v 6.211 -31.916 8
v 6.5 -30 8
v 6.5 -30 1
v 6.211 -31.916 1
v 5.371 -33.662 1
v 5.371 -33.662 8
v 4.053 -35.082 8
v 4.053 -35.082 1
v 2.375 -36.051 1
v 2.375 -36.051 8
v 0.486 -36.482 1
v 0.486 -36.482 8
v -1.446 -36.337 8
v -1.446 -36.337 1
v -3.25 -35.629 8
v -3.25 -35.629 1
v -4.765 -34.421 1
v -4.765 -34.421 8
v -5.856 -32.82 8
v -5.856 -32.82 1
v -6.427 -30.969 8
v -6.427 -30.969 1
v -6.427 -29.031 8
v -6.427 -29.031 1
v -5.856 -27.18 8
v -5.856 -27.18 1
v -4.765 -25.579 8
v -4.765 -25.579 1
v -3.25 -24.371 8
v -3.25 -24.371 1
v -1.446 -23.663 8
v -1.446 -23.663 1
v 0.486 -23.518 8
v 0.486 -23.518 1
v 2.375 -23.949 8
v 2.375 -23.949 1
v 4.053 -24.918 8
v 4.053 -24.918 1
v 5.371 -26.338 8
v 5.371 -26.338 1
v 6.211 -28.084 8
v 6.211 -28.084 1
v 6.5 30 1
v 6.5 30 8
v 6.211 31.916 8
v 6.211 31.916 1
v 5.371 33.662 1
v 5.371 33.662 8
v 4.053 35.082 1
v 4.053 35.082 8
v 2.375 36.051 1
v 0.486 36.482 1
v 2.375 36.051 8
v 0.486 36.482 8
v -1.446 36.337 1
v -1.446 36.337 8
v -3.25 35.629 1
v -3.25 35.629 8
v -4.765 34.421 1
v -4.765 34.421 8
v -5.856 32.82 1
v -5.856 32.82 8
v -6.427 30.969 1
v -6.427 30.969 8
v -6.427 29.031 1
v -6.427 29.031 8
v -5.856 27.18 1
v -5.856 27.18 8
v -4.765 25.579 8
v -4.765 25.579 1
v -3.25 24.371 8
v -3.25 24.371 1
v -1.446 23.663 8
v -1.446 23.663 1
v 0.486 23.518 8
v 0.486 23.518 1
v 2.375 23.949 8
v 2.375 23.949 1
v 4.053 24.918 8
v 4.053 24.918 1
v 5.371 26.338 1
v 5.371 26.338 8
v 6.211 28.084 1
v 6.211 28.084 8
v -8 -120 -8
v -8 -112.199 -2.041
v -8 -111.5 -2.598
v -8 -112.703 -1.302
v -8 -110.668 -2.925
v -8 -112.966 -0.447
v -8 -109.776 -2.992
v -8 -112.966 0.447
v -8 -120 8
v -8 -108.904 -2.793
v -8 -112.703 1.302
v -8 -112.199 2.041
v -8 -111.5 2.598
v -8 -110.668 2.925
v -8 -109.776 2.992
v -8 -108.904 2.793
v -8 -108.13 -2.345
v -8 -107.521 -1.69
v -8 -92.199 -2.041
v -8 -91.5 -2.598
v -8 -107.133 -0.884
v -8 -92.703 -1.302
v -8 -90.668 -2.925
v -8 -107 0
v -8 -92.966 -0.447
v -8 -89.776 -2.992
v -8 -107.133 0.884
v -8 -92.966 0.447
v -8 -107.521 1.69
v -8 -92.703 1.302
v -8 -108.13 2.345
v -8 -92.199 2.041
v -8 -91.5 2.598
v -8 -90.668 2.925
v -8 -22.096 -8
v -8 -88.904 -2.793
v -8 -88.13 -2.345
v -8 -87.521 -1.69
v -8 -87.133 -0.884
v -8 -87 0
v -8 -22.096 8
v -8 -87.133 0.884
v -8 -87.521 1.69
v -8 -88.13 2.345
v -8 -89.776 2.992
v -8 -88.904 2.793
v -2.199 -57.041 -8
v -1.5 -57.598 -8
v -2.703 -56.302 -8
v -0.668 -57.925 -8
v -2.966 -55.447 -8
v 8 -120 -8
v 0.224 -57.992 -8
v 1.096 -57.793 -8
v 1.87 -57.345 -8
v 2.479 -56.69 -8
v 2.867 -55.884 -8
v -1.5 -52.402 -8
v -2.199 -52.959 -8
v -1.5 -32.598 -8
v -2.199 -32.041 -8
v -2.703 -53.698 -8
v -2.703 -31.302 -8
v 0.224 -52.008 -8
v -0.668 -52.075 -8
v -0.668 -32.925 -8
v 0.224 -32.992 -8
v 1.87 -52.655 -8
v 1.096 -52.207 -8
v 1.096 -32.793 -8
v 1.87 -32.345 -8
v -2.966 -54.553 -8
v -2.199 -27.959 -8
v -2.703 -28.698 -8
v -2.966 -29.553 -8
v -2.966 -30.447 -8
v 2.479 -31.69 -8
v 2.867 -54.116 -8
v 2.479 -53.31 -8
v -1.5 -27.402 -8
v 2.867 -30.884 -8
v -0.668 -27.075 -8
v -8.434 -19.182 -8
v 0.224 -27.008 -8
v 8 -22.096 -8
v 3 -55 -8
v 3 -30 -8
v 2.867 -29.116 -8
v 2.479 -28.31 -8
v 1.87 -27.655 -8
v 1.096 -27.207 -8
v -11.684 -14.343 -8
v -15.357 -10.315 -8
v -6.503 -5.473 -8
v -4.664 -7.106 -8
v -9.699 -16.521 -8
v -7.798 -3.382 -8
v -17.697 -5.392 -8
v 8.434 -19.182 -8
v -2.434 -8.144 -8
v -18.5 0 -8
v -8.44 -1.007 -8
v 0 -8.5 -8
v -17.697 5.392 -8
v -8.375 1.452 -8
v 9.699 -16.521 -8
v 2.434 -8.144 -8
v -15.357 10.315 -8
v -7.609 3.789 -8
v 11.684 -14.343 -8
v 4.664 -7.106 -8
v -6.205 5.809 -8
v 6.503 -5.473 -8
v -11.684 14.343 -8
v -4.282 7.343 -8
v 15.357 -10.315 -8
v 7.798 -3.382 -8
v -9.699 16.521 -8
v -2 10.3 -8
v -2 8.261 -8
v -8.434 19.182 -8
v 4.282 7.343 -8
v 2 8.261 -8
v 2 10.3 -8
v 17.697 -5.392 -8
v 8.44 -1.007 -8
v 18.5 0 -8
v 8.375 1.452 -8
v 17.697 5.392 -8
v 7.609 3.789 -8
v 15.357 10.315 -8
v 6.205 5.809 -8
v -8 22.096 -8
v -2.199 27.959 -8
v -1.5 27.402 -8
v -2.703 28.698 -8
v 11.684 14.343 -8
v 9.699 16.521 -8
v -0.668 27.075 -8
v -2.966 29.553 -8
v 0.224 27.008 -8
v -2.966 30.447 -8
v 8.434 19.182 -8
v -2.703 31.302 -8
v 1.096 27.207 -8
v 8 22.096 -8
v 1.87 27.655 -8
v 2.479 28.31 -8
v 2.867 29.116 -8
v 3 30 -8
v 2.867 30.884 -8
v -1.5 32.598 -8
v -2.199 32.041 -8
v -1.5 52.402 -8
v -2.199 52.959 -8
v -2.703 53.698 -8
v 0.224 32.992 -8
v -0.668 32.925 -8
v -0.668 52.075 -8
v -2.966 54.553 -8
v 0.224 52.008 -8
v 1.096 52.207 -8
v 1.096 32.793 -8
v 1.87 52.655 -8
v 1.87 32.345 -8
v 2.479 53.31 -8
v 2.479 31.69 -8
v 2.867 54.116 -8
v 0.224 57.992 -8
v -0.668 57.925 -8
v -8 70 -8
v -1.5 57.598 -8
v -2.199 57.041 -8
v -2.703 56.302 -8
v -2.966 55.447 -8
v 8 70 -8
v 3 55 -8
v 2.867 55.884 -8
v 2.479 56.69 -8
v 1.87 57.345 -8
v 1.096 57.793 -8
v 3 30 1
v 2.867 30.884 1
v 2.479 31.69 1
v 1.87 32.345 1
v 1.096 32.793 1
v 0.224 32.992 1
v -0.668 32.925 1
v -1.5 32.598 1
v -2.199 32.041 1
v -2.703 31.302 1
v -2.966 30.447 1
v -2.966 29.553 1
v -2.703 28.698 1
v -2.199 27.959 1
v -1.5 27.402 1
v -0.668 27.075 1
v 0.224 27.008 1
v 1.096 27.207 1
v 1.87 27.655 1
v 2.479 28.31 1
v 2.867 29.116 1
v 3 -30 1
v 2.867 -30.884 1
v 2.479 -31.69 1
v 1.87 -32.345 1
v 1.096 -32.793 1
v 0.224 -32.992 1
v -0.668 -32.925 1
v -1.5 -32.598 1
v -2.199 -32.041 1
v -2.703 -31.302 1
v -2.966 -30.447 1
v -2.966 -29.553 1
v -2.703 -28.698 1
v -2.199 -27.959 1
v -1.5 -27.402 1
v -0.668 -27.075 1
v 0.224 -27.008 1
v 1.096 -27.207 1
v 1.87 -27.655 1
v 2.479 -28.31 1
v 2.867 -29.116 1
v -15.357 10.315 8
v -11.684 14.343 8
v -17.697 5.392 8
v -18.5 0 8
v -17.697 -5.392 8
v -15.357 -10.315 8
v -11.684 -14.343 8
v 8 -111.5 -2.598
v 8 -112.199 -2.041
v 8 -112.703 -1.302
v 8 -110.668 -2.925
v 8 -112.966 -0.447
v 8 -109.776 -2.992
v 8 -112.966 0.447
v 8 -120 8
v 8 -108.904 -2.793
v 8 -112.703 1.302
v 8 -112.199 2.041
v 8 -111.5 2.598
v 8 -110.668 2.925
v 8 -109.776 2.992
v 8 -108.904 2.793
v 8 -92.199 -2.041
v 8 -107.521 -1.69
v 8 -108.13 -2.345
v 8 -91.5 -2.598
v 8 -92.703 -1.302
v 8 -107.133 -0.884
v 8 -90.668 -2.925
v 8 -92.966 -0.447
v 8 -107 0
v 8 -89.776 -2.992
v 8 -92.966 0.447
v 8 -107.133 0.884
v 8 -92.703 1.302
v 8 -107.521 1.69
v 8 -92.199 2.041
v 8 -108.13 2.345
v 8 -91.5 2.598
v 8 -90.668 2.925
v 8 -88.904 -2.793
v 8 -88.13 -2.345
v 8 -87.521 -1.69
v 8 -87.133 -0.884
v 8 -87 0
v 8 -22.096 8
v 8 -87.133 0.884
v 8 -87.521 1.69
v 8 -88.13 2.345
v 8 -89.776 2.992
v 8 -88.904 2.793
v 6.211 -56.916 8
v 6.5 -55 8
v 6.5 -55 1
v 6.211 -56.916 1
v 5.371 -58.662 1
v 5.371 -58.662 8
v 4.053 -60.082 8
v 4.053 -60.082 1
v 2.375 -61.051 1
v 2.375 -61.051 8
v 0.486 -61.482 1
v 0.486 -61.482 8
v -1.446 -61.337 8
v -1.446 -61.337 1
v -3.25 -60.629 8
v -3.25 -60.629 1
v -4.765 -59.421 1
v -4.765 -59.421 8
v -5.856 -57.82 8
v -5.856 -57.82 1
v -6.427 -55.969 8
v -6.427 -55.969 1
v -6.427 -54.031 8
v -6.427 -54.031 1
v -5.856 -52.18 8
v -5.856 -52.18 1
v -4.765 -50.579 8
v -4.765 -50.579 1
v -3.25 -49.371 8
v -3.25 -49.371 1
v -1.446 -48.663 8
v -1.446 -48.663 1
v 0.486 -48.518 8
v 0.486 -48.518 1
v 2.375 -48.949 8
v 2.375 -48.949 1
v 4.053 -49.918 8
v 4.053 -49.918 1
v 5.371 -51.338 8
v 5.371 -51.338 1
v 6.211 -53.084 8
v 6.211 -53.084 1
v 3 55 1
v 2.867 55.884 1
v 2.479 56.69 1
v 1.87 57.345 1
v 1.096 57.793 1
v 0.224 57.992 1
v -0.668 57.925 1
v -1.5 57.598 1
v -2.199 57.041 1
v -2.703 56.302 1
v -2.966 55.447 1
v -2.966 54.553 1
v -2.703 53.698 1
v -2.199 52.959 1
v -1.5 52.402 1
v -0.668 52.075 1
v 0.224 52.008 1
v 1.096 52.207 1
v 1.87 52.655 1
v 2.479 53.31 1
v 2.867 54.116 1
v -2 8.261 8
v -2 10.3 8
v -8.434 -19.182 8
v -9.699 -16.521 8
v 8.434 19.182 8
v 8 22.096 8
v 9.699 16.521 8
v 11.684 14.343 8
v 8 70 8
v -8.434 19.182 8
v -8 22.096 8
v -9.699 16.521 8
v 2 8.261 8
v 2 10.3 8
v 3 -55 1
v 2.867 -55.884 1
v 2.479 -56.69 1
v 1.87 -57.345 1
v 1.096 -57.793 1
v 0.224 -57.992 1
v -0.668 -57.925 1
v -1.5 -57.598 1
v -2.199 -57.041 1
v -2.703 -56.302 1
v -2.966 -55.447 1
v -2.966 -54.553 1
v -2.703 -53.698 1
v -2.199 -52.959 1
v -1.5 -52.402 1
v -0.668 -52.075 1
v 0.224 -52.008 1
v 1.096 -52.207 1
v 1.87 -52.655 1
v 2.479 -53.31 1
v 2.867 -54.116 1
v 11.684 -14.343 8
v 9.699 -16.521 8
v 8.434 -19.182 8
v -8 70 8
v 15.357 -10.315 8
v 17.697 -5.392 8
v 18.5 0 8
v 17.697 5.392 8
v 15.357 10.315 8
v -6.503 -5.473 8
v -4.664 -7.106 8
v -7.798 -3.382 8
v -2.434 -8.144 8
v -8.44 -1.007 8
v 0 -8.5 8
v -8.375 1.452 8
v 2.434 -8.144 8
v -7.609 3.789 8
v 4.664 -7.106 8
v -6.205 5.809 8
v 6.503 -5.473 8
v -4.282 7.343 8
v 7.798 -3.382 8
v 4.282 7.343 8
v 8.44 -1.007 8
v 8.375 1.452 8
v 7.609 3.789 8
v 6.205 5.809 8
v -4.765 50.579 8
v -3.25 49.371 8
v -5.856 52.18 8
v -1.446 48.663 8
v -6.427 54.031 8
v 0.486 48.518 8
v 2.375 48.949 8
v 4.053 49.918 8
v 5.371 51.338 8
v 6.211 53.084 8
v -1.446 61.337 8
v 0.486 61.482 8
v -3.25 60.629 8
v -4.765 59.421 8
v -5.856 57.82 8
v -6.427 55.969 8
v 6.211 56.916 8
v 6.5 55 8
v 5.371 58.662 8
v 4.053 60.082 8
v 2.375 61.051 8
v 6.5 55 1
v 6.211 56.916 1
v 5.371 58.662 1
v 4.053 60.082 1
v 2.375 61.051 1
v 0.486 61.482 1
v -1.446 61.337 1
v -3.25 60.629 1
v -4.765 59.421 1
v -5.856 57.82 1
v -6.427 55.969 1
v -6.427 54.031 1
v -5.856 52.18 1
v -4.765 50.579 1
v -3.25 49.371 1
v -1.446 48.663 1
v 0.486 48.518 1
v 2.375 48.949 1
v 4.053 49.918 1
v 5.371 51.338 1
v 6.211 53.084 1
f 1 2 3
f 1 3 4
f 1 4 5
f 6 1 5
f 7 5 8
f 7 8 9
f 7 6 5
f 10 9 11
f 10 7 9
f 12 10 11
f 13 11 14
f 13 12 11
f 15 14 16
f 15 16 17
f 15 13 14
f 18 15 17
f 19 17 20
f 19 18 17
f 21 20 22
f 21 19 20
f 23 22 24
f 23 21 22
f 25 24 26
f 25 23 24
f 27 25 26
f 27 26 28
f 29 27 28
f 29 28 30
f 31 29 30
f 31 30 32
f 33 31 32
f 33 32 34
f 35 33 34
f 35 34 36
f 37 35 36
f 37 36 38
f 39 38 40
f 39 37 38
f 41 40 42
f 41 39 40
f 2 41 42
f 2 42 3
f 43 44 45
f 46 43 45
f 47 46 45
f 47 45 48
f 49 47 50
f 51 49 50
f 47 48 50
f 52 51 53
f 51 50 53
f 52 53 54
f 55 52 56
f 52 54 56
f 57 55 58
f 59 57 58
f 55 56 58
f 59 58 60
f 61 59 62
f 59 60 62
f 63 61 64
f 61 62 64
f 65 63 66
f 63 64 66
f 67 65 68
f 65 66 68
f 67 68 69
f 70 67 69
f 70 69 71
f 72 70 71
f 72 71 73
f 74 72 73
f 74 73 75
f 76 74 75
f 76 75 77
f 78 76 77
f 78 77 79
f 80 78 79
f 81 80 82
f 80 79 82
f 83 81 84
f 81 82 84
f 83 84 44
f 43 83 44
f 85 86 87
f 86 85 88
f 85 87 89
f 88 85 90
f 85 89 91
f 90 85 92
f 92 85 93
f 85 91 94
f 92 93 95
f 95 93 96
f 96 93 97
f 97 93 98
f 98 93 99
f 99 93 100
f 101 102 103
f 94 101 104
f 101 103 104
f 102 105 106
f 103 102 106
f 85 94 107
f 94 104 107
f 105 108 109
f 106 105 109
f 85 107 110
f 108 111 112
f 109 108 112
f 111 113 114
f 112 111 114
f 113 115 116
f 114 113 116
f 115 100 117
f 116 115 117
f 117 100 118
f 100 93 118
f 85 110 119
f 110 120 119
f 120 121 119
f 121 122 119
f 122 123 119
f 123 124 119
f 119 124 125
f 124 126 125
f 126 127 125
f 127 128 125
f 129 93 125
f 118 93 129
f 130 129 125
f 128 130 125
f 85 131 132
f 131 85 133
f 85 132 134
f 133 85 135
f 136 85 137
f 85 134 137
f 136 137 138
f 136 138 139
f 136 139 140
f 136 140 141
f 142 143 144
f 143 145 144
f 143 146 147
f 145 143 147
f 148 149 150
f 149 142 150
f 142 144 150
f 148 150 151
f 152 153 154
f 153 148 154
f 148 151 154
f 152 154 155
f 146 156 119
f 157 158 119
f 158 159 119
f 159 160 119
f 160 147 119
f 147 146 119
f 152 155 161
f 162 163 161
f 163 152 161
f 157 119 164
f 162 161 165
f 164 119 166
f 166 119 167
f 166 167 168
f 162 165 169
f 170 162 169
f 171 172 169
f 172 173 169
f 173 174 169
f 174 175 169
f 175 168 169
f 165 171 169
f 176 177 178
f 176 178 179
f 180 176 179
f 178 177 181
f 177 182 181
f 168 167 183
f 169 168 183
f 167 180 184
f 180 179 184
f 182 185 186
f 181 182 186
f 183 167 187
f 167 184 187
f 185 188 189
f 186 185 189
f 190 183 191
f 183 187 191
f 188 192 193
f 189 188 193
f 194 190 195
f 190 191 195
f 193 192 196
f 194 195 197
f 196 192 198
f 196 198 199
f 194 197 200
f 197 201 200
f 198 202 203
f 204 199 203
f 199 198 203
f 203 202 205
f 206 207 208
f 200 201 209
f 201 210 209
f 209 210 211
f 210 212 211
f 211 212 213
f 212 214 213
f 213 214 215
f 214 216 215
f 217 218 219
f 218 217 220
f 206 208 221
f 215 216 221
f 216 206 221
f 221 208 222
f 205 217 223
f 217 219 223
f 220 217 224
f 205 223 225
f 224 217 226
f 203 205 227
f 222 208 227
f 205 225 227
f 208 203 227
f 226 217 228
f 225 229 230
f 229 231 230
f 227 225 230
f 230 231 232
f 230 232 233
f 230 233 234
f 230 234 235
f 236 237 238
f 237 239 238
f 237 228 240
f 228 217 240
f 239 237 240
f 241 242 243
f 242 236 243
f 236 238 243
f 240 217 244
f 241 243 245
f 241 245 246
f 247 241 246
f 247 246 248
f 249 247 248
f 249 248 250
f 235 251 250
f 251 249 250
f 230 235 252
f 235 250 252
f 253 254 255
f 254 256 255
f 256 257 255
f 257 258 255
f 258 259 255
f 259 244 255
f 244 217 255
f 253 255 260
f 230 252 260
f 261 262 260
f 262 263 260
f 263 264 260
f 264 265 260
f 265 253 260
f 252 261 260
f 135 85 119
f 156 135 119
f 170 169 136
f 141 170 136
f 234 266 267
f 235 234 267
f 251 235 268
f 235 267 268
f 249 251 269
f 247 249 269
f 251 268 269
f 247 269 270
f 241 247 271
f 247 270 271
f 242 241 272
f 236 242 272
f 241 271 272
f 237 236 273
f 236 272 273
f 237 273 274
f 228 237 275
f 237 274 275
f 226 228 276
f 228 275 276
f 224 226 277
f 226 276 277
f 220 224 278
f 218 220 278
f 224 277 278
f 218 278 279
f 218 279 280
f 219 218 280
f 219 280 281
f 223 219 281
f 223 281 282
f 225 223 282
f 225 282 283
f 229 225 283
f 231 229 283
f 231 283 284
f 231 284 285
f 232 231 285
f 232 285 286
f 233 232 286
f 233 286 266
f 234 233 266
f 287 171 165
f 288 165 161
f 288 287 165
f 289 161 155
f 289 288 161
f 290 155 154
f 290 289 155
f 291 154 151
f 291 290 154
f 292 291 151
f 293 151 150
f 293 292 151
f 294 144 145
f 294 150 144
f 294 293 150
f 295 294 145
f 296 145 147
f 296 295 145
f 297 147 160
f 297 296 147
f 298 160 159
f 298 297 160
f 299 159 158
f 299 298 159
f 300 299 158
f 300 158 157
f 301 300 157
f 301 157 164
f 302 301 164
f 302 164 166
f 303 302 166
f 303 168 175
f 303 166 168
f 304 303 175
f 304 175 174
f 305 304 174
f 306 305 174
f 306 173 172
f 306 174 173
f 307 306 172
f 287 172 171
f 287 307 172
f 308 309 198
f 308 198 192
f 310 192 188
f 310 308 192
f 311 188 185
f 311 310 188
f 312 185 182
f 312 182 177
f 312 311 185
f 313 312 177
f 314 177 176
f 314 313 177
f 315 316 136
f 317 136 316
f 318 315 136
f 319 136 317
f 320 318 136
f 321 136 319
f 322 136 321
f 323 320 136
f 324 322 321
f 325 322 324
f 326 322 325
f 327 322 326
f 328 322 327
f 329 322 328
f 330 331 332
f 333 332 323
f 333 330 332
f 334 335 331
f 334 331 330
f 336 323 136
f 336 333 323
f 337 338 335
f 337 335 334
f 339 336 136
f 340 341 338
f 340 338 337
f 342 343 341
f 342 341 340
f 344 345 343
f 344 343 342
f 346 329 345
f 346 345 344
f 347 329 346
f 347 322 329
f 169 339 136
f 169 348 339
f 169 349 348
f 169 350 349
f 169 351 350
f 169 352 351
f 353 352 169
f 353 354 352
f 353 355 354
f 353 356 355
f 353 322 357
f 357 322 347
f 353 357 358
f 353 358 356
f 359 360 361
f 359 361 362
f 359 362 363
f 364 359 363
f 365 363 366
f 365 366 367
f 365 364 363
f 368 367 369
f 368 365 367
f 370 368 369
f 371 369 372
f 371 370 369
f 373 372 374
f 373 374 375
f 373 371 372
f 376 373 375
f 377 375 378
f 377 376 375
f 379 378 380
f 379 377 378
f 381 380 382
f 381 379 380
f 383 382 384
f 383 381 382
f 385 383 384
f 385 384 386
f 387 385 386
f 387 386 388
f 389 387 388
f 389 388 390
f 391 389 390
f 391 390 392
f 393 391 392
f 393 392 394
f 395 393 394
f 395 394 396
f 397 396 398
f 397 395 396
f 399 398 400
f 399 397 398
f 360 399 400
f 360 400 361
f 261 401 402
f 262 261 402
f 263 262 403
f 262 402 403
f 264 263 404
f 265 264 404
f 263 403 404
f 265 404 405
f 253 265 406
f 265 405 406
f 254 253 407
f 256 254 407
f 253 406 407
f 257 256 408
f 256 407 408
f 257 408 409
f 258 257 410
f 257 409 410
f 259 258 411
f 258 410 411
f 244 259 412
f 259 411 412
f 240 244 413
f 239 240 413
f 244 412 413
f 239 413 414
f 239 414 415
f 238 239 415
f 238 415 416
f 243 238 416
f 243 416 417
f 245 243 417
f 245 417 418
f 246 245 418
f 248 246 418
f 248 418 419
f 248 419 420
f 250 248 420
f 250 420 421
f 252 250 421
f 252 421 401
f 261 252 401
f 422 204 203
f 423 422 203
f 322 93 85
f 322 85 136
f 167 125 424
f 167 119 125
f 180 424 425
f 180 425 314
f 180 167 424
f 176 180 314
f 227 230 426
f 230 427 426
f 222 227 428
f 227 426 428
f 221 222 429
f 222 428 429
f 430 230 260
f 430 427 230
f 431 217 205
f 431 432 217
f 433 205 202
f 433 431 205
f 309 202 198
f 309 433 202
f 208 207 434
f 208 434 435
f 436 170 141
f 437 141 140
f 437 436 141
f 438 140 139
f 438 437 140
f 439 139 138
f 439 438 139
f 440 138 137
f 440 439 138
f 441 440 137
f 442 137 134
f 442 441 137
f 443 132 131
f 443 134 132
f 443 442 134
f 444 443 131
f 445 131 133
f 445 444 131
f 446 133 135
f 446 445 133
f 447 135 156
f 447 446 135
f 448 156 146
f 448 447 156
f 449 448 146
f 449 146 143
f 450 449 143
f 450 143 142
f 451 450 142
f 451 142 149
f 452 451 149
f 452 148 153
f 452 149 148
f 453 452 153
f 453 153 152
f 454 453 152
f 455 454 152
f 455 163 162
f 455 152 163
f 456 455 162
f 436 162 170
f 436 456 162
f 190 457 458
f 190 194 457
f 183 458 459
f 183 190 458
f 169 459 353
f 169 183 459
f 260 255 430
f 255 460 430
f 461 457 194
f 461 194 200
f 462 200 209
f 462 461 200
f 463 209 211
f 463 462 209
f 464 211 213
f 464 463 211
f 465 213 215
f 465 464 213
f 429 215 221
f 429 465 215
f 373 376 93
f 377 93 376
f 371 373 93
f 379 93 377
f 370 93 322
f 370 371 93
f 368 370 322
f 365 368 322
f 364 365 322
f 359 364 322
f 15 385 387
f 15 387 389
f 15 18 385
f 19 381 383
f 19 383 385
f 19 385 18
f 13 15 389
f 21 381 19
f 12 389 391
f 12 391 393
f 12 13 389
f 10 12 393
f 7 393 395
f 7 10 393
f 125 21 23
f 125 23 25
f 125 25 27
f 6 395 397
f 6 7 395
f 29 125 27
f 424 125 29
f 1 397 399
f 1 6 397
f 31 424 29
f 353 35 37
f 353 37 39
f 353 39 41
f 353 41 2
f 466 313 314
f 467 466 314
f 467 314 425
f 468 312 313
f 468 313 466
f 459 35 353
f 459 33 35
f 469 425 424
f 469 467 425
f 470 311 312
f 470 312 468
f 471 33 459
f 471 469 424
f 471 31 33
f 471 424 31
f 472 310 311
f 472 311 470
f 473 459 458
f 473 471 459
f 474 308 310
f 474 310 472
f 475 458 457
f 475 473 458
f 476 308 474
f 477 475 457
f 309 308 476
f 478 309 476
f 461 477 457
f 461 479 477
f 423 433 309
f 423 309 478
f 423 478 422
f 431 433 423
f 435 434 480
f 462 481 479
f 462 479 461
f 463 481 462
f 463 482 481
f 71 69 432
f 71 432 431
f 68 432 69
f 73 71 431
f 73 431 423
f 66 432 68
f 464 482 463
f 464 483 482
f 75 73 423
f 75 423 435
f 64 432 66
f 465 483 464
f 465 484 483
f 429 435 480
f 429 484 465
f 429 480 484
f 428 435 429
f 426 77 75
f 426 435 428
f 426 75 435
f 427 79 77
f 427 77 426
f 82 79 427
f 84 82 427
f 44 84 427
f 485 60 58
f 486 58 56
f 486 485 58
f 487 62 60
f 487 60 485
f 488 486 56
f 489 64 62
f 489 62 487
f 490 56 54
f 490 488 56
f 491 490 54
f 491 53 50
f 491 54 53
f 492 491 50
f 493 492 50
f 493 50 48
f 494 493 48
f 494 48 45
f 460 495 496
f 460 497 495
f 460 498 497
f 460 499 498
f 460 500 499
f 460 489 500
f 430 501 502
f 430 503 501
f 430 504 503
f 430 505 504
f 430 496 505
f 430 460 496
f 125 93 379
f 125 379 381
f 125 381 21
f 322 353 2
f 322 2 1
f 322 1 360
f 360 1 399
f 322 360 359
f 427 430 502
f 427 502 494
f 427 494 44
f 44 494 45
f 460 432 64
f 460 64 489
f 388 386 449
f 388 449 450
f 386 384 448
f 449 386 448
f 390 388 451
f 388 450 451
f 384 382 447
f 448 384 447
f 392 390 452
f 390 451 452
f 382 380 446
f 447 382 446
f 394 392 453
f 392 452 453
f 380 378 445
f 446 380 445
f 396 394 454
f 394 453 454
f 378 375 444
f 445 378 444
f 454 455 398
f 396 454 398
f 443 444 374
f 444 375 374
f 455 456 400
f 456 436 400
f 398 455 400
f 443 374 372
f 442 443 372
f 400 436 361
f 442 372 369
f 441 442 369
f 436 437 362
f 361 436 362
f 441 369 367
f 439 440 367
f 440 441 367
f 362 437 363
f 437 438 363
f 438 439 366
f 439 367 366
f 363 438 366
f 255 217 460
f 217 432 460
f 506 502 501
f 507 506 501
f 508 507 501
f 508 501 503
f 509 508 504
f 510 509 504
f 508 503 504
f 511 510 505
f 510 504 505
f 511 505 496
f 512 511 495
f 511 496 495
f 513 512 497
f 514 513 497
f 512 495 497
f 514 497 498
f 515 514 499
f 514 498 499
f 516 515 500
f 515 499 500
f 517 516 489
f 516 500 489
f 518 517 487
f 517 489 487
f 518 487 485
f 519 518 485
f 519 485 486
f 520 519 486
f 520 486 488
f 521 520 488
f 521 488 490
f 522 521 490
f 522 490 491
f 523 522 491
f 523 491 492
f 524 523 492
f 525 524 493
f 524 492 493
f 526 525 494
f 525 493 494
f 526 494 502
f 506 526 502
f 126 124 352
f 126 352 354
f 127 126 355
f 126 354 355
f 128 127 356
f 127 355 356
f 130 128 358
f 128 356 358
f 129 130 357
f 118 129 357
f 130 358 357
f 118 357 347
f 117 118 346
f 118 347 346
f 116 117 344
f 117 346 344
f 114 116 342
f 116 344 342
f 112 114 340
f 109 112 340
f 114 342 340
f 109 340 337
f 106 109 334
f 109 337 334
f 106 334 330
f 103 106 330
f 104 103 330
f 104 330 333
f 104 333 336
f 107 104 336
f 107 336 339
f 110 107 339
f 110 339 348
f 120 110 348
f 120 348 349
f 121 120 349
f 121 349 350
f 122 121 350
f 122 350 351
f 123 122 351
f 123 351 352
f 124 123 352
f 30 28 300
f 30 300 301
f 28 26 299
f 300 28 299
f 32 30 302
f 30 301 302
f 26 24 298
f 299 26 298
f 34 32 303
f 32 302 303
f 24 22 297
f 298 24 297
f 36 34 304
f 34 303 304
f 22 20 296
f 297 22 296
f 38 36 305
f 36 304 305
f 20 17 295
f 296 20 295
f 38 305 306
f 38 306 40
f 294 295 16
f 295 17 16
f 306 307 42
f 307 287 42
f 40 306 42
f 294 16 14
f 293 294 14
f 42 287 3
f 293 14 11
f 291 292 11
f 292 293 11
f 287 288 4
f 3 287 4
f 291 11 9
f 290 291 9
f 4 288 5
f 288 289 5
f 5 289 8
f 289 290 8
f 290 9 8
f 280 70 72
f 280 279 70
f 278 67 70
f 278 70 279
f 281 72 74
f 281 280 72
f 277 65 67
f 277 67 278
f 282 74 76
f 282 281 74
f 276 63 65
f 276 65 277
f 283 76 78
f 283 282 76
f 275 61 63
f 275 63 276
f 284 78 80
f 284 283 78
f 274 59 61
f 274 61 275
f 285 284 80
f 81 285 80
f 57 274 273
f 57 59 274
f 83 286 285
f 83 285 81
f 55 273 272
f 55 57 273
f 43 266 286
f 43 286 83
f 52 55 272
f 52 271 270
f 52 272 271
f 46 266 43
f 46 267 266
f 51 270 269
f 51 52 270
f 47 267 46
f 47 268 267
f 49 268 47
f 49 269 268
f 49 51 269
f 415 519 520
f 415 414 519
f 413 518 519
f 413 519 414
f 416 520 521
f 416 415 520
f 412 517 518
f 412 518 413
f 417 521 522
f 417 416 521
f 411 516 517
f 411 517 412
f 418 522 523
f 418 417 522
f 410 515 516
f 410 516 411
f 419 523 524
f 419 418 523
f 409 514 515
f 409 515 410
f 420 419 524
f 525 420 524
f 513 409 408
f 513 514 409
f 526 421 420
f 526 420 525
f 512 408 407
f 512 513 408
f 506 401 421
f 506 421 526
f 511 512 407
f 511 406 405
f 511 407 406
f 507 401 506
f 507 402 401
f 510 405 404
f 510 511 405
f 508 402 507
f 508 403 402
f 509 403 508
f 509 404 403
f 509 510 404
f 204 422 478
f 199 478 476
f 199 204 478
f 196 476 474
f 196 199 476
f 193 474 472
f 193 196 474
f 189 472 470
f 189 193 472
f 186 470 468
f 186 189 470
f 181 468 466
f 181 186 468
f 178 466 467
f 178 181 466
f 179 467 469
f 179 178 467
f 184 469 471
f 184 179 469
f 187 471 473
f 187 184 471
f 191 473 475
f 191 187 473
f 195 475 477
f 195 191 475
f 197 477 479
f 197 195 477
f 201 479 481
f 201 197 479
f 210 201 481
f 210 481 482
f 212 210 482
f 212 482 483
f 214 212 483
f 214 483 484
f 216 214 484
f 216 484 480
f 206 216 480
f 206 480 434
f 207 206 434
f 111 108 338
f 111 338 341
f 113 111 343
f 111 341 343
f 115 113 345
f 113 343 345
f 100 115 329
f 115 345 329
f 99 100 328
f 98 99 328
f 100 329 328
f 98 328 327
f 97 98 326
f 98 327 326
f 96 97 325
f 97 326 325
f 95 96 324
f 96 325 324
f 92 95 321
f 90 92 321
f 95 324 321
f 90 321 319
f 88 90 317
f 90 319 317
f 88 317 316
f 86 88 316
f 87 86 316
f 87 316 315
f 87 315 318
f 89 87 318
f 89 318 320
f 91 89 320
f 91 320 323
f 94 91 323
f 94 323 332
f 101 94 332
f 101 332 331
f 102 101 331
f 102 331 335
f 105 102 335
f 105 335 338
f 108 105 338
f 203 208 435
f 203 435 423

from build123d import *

# Parameters (mm, degrees)
SKETCH1_R           = 18.5
SKETCH1_R_2         = 8.5
BOSS_EXTRUDE1_DEPTH = 8
SKETCH2_W           = 16
SKETCH2_H           = 53.319172682
BOSS_EXTRUDE2_DEPTH = 8
SKETCH3_W           = 16
SKETCH3_H           = 103.319172682
BOSS_EXTRUDE3_DEPTH = 8
SKETCH4_W           = 4
SKETCH4_H           = 2.038644179
CUT_EXTRUDE1_DEPTH  = 123.467342586
FILLET1_R           = 10
SKETCH7_R           = 6.5
CUT_EXTRUDE3_DEPTH  = 7
SKETCH8_R           = 3
CUT_EXTRUDE4_DEPTH  = 122.750770018
SKETCH9_R           = 3
CUT_EXTRUDE5_DEPTH  = 124.151329672


with BuildPart() as part:
    # Sketch1 → Boss-Extrude1 (new, symmetric)
    with BuildSketch(Plane.XY):
        Circle(SKETCH1_R)
        Circle(SKETCH1_R_2, mode=Mode.SUBTRACT)
    extrude(amount=BOSS_EXTRUDE1_DEPTH, both=True)

    # Sketch2 → Boss-Extrude2 (add, symmetric)
    with BuildSketch(Plane.XY):
        with Locations((0, 43.340413659)):
            Rectangle(SKETCH2_W, SKETCH2_H)
    extrude(amount=BOSS_EXTRUDE2_DEPTH, both=True)

    # Sketch3 → Boss-Extrude3 (add, symmetric)
    with BuildSketch(Plane.XY):
        with Locations((0, -68.340413659)):
            Rectangle(SKETCH3_W, SKETCH3_H)
    extrude(amount=BOSS_EXTRUDE3_DEPTH, both=True)

    # Sketch4 → Cut-Extrude1 (cut, through all)
    with BuildSketch(Plane(origin=(0, 0, -8), x_dir=(-1, 0, 0), z_dir=(0, 0, -1))):
        with Locations((0, 9.28067791)):
            Rectangle(SKETCH4_W, SKETCH4_H)
    extrude(amount=-CUT_EXTRUDE1_DEPTH, mode=Mode.SUBTRACT)

    # Fillet1
    fillet1_edges = [part.edges().sort_by_distance(p)[0] for p in [
        (8, 16.680827318, 0),
        (-8, 16.680827318, 0),
        (8, -16.680827318, 0),
        (-8, -16.680827318, 0),
    ]]
    fillet(fillet1_edges, radius=FILLET1_R)

    # Sketch7 → Cut-Extrude3 (cut)
    with BuildSketch(Plane.XY.offset(8)):
        with Locations((0, 55)):
            Circle(SKETCH7_R)
        with Locations((0, 30)):
            Circle(SKETCH7_R)
    cut_extrude3 = extrude(amount=-CUT_EXTRUDE3_DEPTH, mode=Mode.SUBTRACT)

    # Mirror1: Cut-Extrude3 across plane
    add(cut_extrude3.mirror(Plane.ZX), mode=Mode.SUBTRACT)

    # Sketch8 → Cut-Extrude4 (cut, through all)
    with BuildSketch(Plane.XY.offset(1)):
        with Locations((0, 55)):
            Circle(SKETCH8_R)
        with Locations((0, 30)):
            Circle(SKETCH8_R)
    cut_extrude4 = extrude(amount=-CUT_EXTRUDE4_DEPTH, mode=Mode.SUBTRACT)

    # Mirror2: Cut-Extrude4 across plane
    add(cut_extrude4.mirror(Plane.ZX), mode=Mode.SUBTRACT)

    # Sketch9 → Cut-Extrude5 (cut, through all)
    with BuildSketch(Plane(origin=(8, 0, 0), x_dir=(0, 0, -1), z_dir=(1, 0, 0))):
        with Locations(Location((0, -110, 0), (0, 0, 90))):
            Circle(SKETCH9_R)
        with Locations(Location((0, -90, 0), (0, 0, 90))):
            Circle(SKETCH9_R)
    extrude(amount=-CUT_EXTRUDE5_DEPTH, mode=Mode.SUBTRACT)


solid = part.part
